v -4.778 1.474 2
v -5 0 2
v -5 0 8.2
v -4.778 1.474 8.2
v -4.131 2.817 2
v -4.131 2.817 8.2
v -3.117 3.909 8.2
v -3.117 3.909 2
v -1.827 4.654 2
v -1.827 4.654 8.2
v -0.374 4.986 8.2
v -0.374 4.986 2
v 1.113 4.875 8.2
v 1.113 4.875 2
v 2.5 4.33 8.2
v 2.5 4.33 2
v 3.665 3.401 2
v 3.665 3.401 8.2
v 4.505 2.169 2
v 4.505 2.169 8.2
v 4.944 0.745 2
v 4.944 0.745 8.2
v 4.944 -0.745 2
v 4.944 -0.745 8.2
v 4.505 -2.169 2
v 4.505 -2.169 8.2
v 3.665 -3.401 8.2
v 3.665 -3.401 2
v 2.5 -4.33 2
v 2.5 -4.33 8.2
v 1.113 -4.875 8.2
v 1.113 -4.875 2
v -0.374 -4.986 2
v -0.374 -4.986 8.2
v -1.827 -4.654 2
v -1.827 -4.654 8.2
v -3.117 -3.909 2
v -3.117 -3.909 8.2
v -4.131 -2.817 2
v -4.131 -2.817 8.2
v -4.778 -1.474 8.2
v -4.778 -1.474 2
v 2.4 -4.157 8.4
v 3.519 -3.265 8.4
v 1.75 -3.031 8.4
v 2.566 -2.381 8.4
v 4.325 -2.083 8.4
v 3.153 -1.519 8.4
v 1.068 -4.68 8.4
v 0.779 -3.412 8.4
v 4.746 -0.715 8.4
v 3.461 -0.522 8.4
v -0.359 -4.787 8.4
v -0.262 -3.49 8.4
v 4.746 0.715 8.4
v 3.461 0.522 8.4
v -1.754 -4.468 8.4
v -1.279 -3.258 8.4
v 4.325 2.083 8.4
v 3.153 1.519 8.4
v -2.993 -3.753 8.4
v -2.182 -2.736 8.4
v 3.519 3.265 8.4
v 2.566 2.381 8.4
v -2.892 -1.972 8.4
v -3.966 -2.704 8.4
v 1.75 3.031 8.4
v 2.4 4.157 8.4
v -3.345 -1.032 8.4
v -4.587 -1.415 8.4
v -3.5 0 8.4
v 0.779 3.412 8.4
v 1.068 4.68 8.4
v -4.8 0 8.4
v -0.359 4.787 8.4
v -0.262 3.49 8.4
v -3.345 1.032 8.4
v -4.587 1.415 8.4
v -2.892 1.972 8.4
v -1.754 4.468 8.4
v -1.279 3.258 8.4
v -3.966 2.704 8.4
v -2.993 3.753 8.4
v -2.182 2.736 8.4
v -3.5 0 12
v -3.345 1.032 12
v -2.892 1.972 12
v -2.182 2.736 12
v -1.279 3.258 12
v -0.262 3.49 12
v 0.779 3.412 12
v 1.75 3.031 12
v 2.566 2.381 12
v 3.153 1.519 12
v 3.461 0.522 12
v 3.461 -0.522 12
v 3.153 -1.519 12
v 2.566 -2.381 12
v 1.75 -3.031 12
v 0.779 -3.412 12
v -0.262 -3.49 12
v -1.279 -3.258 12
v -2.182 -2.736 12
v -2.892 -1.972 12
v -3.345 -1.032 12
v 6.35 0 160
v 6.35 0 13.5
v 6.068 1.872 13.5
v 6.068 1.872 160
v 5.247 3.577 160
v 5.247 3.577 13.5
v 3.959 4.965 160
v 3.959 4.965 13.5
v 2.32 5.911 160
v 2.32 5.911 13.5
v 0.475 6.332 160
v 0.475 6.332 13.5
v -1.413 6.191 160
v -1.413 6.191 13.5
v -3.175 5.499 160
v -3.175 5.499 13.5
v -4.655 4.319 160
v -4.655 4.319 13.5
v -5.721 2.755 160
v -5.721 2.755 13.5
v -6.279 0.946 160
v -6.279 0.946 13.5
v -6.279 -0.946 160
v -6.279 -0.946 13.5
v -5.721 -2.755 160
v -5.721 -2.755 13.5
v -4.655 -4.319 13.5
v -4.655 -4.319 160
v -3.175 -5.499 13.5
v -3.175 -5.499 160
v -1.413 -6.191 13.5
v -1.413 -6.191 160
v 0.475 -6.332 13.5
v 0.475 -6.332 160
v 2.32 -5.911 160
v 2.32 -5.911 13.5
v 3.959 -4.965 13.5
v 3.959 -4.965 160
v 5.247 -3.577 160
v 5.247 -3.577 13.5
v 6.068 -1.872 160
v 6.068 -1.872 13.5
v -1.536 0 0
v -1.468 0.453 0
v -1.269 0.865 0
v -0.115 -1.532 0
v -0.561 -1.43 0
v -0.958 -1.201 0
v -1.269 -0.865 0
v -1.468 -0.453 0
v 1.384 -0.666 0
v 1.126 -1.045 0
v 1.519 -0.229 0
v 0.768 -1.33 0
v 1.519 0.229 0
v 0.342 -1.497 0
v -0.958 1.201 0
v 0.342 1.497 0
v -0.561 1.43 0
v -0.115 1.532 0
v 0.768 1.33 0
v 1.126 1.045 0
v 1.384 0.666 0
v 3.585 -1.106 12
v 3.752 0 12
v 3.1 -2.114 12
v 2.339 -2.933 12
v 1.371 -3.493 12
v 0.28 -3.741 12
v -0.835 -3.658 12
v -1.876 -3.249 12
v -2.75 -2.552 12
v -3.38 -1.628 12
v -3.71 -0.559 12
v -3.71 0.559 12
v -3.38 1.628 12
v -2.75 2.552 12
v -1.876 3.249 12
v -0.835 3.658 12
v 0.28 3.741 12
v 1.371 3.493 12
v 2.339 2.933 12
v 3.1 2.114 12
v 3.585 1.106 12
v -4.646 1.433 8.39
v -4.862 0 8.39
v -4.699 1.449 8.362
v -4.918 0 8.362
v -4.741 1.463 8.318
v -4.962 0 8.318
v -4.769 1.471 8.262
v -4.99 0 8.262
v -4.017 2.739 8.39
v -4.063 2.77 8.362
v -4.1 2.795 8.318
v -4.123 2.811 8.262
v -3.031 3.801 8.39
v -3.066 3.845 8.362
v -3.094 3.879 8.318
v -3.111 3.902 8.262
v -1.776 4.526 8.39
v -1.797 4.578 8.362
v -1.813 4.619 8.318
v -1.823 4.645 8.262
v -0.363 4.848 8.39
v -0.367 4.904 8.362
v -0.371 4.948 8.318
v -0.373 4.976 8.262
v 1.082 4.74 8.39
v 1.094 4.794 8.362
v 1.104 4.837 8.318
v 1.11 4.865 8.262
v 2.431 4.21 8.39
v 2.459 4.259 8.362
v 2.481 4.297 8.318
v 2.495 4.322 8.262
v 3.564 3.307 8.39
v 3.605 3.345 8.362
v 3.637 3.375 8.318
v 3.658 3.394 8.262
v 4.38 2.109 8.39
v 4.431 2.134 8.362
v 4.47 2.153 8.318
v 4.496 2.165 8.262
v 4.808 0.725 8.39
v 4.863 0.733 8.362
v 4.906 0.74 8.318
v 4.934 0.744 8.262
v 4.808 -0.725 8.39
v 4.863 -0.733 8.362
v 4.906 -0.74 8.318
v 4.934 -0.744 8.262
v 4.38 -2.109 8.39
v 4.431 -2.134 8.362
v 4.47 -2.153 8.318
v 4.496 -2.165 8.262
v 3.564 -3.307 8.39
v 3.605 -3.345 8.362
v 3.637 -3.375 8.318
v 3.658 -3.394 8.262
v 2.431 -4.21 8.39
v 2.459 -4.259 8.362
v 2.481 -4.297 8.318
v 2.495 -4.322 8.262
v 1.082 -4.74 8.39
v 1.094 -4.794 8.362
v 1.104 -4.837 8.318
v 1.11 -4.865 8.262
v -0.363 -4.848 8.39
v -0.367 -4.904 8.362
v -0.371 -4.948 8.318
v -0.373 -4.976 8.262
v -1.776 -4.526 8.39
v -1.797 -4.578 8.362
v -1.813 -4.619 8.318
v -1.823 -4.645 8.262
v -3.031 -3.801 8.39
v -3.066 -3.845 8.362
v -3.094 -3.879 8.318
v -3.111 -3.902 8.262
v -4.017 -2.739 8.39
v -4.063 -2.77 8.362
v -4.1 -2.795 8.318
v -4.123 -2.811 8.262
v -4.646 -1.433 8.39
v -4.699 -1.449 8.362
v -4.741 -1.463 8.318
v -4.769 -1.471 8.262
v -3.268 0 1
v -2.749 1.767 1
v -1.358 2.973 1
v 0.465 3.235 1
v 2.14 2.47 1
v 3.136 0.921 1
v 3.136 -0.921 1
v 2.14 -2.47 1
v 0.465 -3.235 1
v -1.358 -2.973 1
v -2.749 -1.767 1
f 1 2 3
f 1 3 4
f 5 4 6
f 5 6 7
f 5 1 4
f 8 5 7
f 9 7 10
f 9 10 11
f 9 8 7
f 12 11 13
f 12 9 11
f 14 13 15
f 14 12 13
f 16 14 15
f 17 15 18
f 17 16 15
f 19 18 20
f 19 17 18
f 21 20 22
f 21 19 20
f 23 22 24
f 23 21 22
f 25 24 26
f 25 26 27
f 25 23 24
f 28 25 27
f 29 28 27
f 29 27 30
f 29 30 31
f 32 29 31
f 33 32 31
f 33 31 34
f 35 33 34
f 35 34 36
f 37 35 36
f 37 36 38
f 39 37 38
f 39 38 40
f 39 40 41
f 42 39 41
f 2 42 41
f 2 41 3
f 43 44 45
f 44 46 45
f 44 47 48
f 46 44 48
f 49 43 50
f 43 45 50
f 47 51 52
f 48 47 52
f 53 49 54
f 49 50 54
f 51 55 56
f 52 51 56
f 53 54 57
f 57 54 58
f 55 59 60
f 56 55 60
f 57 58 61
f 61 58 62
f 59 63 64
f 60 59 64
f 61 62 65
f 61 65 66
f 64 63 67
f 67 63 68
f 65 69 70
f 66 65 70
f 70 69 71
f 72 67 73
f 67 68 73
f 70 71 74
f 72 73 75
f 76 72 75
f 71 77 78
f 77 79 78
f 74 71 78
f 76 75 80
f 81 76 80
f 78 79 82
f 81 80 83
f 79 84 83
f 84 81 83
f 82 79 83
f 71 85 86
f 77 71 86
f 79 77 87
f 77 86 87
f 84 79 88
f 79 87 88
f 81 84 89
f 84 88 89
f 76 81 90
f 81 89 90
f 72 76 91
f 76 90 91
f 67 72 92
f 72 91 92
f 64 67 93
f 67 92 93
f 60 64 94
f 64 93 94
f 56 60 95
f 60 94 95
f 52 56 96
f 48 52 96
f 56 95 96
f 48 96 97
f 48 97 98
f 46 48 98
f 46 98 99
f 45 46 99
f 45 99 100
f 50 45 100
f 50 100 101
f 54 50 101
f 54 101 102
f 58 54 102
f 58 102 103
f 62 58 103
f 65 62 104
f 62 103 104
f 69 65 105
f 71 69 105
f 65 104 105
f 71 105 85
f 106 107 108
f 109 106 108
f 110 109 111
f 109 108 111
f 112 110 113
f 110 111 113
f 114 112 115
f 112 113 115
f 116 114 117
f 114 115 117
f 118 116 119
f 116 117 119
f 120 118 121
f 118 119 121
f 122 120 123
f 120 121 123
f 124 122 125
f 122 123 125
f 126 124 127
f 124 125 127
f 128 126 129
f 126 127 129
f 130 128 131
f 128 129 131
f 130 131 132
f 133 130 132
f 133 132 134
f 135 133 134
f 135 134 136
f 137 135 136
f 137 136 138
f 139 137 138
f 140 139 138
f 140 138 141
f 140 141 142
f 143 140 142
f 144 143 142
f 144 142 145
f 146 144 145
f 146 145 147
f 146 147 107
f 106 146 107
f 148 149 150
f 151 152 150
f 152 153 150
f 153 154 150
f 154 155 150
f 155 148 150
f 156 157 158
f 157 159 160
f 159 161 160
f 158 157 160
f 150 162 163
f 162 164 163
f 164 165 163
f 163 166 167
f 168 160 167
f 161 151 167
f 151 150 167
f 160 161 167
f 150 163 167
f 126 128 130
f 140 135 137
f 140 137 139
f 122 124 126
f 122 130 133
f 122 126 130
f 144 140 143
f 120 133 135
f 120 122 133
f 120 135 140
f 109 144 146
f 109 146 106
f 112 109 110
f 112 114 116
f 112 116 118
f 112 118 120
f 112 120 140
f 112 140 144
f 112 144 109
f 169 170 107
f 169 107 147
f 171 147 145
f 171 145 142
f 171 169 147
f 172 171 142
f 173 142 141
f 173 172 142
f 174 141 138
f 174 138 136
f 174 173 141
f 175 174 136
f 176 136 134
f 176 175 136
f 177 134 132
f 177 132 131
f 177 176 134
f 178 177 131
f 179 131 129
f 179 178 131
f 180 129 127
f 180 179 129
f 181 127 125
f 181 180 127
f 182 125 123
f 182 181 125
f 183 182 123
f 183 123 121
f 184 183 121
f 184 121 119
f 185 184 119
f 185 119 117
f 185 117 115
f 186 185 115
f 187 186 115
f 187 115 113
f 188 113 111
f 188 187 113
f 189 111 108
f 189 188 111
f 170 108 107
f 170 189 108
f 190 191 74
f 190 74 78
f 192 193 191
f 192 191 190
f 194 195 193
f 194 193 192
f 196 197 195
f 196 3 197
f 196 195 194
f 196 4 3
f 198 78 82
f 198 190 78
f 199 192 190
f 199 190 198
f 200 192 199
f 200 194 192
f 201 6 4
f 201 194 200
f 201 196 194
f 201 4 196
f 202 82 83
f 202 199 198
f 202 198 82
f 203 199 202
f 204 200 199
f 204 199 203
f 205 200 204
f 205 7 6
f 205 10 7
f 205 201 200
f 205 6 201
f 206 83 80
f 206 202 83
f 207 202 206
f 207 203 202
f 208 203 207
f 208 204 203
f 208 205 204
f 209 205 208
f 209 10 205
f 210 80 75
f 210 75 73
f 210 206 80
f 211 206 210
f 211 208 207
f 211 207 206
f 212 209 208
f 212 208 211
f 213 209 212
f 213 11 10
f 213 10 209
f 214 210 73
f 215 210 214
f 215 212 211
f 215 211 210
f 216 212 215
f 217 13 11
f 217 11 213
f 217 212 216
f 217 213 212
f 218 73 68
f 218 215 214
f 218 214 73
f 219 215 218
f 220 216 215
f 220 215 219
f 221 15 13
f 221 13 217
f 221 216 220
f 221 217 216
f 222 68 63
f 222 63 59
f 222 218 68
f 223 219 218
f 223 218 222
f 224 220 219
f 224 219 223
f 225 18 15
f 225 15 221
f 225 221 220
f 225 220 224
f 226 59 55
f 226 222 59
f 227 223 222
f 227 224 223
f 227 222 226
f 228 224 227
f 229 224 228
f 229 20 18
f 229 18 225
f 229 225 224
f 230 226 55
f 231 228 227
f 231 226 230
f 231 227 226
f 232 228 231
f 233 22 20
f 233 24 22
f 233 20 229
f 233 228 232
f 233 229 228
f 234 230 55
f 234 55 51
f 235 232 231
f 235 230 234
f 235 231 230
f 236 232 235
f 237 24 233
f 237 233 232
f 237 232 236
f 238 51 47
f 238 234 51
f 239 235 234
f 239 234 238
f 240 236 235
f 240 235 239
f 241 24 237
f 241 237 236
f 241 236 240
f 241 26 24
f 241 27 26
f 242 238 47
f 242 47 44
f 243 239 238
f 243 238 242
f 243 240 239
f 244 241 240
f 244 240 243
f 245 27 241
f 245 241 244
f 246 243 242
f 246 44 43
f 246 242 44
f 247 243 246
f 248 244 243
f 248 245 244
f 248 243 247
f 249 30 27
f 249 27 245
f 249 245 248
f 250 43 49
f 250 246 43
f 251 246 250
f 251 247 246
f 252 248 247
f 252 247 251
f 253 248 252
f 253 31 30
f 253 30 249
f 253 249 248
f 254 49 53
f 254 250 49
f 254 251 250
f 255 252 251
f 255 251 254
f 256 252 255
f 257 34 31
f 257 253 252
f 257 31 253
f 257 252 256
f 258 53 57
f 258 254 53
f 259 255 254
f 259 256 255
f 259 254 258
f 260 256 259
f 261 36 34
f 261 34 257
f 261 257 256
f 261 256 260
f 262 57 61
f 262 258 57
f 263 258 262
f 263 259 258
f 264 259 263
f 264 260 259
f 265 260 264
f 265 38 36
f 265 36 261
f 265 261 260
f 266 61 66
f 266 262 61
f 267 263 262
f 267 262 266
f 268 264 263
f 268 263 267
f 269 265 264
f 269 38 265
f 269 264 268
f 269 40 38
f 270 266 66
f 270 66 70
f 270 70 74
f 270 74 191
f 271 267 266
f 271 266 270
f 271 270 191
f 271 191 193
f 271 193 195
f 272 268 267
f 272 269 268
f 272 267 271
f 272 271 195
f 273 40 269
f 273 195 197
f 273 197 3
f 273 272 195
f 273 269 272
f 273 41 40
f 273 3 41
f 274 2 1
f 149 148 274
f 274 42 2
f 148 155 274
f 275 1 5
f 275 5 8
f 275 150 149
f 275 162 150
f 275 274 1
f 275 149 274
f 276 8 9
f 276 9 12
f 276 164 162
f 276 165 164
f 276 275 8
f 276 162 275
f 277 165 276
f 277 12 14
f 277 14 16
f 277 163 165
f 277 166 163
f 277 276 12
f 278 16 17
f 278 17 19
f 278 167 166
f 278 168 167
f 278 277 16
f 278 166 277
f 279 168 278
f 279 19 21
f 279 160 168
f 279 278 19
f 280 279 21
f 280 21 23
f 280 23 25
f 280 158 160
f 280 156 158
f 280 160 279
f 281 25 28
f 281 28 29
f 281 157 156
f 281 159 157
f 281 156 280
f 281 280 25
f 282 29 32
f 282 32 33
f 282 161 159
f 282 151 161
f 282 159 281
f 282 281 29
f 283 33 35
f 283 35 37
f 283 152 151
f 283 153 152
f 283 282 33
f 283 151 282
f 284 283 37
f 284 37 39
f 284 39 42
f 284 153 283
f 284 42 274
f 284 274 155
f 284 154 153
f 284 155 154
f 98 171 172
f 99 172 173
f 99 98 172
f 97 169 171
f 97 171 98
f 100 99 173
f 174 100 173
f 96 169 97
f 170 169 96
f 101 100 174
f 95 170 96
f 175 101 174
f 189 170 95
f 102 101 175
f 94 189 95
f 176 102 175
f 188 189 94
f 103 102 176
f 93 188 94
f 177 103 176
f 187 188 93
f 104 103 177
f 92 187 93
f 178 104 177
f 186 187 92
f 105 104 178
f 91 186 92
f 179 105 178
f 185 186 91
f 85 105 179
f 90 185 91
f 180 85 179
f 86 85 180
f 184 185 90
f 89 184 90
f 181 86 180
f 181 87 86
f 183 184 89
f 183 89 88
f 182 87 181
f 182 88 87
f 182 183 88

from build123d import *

# Parameters (mm, degrees)
ESBO_O1_R                = 6.35
RESSALTO_EXTRUS_O1_DEPTH = 160
ESBO_O2_OUTSIDE_W        = 46.9
ESBO_O2_OUTSIDE_H        = 46.9
ESBO_O2_OUTSIDE_R        = 5
CORTE_EXTRUS_O1_DEPTH    = 12
ESBO_O4_OUTSIDE_W        = 46.9
ESBO_O4_OUTSIDE_H        = 46.9
ESBO_O4_OUTSIDE_R        = 3.5
CORTE_EXTRUS_O2_DEPTH    = 3.6
FILETE1_R                = 0.2
CHANFRO2_SIZE            = 2
CHANFRO2_SIZE2           = 3.464101615
CHANFRO3_SIZE            = 1.5
CHANFRO3_SIZE2           = 2.598076211


with BuildPart() as part:
    # Esboço1 → Ressalto-extrusão1 (new body)
    with BuildSketch(Plane.XY):
        Circle(ESBO_O1_R)
    extrude(amount=RESSALTO_EXTRUS_O1_DEPTH)

    # Esboço2 outside → Corte-extrusão1 (cut)
    with BuildSketch(Plane(origin=(0, 0, 0), x_dir=(-1, 0, 0), z_dir=(0, 0, -1))):
        Rectangle(ESBO_O2_OUTSIDE_W, ESBO_O2_OUTSIDE_H)
        Circle(ESBO_O2_OUTSIDE_R, mode=Mode.SUBTRACT)
    extrude(amount=-CORTE_EXTRUS_O1_DEPTH, mode=Mode.SUBTRACT)

    # Esboço4 outside → Corte-extrusão2 (cut)
    with BuildSketch(Plane(origin=(0, 0, 12), x_dir=(-1, 0, 0), z_dir=(0, 0, -1))):
        Rectangle(ESBO_O4_OUTSIDE_W, ESBO_O4_OUTSIDE_H)
        Circle(ESBO_O4_OUTSIDE_R, mode=Mode.SUBTRACT)
    extrude(amount=CORTE_EXTRUS_O2_DEPTH, mode=Mode.SUBTRACT)

    # Filete1
    filete1_edges = [part.edges().sort_by_distance(p)[0] for p in [
        (5, 0, 8.4),
    ]]
    fillet(filete1_edges, radius=FILETE1_R)

    # Chanfro2
    chanfro2_edges = [part.edges().sort_by_distance(p)[0] for p in [
        (5, 0, 0),
    ]]
    chanfro2_side = [part.faces().sort_by_distance(p)[0] for p in [
        (5, 0, 4.1),
    ]]
    chamfer(chanfro2_edges, length=CHANFRO2_SIZE, length2=CHANFRO2_SIZE2, reference=chanfro2_side[0])

    # Chanfro3
    chanfro3_edges = [part.edges().sort_by_distance(p)[0] for p in [
        (-6.35, 0, 12),
    ]]
    chanfro3_side = [part.faces().sort_by_distance(p)[0] for p in [
        (-6.35, 0, 86),
    ]]
    chamfer(chanfro3_edges, length=CHANFRO3_SIZE, length2=CHANFRO3_SIZE2, reference=chanfro3_side[0])


solid = part.part
